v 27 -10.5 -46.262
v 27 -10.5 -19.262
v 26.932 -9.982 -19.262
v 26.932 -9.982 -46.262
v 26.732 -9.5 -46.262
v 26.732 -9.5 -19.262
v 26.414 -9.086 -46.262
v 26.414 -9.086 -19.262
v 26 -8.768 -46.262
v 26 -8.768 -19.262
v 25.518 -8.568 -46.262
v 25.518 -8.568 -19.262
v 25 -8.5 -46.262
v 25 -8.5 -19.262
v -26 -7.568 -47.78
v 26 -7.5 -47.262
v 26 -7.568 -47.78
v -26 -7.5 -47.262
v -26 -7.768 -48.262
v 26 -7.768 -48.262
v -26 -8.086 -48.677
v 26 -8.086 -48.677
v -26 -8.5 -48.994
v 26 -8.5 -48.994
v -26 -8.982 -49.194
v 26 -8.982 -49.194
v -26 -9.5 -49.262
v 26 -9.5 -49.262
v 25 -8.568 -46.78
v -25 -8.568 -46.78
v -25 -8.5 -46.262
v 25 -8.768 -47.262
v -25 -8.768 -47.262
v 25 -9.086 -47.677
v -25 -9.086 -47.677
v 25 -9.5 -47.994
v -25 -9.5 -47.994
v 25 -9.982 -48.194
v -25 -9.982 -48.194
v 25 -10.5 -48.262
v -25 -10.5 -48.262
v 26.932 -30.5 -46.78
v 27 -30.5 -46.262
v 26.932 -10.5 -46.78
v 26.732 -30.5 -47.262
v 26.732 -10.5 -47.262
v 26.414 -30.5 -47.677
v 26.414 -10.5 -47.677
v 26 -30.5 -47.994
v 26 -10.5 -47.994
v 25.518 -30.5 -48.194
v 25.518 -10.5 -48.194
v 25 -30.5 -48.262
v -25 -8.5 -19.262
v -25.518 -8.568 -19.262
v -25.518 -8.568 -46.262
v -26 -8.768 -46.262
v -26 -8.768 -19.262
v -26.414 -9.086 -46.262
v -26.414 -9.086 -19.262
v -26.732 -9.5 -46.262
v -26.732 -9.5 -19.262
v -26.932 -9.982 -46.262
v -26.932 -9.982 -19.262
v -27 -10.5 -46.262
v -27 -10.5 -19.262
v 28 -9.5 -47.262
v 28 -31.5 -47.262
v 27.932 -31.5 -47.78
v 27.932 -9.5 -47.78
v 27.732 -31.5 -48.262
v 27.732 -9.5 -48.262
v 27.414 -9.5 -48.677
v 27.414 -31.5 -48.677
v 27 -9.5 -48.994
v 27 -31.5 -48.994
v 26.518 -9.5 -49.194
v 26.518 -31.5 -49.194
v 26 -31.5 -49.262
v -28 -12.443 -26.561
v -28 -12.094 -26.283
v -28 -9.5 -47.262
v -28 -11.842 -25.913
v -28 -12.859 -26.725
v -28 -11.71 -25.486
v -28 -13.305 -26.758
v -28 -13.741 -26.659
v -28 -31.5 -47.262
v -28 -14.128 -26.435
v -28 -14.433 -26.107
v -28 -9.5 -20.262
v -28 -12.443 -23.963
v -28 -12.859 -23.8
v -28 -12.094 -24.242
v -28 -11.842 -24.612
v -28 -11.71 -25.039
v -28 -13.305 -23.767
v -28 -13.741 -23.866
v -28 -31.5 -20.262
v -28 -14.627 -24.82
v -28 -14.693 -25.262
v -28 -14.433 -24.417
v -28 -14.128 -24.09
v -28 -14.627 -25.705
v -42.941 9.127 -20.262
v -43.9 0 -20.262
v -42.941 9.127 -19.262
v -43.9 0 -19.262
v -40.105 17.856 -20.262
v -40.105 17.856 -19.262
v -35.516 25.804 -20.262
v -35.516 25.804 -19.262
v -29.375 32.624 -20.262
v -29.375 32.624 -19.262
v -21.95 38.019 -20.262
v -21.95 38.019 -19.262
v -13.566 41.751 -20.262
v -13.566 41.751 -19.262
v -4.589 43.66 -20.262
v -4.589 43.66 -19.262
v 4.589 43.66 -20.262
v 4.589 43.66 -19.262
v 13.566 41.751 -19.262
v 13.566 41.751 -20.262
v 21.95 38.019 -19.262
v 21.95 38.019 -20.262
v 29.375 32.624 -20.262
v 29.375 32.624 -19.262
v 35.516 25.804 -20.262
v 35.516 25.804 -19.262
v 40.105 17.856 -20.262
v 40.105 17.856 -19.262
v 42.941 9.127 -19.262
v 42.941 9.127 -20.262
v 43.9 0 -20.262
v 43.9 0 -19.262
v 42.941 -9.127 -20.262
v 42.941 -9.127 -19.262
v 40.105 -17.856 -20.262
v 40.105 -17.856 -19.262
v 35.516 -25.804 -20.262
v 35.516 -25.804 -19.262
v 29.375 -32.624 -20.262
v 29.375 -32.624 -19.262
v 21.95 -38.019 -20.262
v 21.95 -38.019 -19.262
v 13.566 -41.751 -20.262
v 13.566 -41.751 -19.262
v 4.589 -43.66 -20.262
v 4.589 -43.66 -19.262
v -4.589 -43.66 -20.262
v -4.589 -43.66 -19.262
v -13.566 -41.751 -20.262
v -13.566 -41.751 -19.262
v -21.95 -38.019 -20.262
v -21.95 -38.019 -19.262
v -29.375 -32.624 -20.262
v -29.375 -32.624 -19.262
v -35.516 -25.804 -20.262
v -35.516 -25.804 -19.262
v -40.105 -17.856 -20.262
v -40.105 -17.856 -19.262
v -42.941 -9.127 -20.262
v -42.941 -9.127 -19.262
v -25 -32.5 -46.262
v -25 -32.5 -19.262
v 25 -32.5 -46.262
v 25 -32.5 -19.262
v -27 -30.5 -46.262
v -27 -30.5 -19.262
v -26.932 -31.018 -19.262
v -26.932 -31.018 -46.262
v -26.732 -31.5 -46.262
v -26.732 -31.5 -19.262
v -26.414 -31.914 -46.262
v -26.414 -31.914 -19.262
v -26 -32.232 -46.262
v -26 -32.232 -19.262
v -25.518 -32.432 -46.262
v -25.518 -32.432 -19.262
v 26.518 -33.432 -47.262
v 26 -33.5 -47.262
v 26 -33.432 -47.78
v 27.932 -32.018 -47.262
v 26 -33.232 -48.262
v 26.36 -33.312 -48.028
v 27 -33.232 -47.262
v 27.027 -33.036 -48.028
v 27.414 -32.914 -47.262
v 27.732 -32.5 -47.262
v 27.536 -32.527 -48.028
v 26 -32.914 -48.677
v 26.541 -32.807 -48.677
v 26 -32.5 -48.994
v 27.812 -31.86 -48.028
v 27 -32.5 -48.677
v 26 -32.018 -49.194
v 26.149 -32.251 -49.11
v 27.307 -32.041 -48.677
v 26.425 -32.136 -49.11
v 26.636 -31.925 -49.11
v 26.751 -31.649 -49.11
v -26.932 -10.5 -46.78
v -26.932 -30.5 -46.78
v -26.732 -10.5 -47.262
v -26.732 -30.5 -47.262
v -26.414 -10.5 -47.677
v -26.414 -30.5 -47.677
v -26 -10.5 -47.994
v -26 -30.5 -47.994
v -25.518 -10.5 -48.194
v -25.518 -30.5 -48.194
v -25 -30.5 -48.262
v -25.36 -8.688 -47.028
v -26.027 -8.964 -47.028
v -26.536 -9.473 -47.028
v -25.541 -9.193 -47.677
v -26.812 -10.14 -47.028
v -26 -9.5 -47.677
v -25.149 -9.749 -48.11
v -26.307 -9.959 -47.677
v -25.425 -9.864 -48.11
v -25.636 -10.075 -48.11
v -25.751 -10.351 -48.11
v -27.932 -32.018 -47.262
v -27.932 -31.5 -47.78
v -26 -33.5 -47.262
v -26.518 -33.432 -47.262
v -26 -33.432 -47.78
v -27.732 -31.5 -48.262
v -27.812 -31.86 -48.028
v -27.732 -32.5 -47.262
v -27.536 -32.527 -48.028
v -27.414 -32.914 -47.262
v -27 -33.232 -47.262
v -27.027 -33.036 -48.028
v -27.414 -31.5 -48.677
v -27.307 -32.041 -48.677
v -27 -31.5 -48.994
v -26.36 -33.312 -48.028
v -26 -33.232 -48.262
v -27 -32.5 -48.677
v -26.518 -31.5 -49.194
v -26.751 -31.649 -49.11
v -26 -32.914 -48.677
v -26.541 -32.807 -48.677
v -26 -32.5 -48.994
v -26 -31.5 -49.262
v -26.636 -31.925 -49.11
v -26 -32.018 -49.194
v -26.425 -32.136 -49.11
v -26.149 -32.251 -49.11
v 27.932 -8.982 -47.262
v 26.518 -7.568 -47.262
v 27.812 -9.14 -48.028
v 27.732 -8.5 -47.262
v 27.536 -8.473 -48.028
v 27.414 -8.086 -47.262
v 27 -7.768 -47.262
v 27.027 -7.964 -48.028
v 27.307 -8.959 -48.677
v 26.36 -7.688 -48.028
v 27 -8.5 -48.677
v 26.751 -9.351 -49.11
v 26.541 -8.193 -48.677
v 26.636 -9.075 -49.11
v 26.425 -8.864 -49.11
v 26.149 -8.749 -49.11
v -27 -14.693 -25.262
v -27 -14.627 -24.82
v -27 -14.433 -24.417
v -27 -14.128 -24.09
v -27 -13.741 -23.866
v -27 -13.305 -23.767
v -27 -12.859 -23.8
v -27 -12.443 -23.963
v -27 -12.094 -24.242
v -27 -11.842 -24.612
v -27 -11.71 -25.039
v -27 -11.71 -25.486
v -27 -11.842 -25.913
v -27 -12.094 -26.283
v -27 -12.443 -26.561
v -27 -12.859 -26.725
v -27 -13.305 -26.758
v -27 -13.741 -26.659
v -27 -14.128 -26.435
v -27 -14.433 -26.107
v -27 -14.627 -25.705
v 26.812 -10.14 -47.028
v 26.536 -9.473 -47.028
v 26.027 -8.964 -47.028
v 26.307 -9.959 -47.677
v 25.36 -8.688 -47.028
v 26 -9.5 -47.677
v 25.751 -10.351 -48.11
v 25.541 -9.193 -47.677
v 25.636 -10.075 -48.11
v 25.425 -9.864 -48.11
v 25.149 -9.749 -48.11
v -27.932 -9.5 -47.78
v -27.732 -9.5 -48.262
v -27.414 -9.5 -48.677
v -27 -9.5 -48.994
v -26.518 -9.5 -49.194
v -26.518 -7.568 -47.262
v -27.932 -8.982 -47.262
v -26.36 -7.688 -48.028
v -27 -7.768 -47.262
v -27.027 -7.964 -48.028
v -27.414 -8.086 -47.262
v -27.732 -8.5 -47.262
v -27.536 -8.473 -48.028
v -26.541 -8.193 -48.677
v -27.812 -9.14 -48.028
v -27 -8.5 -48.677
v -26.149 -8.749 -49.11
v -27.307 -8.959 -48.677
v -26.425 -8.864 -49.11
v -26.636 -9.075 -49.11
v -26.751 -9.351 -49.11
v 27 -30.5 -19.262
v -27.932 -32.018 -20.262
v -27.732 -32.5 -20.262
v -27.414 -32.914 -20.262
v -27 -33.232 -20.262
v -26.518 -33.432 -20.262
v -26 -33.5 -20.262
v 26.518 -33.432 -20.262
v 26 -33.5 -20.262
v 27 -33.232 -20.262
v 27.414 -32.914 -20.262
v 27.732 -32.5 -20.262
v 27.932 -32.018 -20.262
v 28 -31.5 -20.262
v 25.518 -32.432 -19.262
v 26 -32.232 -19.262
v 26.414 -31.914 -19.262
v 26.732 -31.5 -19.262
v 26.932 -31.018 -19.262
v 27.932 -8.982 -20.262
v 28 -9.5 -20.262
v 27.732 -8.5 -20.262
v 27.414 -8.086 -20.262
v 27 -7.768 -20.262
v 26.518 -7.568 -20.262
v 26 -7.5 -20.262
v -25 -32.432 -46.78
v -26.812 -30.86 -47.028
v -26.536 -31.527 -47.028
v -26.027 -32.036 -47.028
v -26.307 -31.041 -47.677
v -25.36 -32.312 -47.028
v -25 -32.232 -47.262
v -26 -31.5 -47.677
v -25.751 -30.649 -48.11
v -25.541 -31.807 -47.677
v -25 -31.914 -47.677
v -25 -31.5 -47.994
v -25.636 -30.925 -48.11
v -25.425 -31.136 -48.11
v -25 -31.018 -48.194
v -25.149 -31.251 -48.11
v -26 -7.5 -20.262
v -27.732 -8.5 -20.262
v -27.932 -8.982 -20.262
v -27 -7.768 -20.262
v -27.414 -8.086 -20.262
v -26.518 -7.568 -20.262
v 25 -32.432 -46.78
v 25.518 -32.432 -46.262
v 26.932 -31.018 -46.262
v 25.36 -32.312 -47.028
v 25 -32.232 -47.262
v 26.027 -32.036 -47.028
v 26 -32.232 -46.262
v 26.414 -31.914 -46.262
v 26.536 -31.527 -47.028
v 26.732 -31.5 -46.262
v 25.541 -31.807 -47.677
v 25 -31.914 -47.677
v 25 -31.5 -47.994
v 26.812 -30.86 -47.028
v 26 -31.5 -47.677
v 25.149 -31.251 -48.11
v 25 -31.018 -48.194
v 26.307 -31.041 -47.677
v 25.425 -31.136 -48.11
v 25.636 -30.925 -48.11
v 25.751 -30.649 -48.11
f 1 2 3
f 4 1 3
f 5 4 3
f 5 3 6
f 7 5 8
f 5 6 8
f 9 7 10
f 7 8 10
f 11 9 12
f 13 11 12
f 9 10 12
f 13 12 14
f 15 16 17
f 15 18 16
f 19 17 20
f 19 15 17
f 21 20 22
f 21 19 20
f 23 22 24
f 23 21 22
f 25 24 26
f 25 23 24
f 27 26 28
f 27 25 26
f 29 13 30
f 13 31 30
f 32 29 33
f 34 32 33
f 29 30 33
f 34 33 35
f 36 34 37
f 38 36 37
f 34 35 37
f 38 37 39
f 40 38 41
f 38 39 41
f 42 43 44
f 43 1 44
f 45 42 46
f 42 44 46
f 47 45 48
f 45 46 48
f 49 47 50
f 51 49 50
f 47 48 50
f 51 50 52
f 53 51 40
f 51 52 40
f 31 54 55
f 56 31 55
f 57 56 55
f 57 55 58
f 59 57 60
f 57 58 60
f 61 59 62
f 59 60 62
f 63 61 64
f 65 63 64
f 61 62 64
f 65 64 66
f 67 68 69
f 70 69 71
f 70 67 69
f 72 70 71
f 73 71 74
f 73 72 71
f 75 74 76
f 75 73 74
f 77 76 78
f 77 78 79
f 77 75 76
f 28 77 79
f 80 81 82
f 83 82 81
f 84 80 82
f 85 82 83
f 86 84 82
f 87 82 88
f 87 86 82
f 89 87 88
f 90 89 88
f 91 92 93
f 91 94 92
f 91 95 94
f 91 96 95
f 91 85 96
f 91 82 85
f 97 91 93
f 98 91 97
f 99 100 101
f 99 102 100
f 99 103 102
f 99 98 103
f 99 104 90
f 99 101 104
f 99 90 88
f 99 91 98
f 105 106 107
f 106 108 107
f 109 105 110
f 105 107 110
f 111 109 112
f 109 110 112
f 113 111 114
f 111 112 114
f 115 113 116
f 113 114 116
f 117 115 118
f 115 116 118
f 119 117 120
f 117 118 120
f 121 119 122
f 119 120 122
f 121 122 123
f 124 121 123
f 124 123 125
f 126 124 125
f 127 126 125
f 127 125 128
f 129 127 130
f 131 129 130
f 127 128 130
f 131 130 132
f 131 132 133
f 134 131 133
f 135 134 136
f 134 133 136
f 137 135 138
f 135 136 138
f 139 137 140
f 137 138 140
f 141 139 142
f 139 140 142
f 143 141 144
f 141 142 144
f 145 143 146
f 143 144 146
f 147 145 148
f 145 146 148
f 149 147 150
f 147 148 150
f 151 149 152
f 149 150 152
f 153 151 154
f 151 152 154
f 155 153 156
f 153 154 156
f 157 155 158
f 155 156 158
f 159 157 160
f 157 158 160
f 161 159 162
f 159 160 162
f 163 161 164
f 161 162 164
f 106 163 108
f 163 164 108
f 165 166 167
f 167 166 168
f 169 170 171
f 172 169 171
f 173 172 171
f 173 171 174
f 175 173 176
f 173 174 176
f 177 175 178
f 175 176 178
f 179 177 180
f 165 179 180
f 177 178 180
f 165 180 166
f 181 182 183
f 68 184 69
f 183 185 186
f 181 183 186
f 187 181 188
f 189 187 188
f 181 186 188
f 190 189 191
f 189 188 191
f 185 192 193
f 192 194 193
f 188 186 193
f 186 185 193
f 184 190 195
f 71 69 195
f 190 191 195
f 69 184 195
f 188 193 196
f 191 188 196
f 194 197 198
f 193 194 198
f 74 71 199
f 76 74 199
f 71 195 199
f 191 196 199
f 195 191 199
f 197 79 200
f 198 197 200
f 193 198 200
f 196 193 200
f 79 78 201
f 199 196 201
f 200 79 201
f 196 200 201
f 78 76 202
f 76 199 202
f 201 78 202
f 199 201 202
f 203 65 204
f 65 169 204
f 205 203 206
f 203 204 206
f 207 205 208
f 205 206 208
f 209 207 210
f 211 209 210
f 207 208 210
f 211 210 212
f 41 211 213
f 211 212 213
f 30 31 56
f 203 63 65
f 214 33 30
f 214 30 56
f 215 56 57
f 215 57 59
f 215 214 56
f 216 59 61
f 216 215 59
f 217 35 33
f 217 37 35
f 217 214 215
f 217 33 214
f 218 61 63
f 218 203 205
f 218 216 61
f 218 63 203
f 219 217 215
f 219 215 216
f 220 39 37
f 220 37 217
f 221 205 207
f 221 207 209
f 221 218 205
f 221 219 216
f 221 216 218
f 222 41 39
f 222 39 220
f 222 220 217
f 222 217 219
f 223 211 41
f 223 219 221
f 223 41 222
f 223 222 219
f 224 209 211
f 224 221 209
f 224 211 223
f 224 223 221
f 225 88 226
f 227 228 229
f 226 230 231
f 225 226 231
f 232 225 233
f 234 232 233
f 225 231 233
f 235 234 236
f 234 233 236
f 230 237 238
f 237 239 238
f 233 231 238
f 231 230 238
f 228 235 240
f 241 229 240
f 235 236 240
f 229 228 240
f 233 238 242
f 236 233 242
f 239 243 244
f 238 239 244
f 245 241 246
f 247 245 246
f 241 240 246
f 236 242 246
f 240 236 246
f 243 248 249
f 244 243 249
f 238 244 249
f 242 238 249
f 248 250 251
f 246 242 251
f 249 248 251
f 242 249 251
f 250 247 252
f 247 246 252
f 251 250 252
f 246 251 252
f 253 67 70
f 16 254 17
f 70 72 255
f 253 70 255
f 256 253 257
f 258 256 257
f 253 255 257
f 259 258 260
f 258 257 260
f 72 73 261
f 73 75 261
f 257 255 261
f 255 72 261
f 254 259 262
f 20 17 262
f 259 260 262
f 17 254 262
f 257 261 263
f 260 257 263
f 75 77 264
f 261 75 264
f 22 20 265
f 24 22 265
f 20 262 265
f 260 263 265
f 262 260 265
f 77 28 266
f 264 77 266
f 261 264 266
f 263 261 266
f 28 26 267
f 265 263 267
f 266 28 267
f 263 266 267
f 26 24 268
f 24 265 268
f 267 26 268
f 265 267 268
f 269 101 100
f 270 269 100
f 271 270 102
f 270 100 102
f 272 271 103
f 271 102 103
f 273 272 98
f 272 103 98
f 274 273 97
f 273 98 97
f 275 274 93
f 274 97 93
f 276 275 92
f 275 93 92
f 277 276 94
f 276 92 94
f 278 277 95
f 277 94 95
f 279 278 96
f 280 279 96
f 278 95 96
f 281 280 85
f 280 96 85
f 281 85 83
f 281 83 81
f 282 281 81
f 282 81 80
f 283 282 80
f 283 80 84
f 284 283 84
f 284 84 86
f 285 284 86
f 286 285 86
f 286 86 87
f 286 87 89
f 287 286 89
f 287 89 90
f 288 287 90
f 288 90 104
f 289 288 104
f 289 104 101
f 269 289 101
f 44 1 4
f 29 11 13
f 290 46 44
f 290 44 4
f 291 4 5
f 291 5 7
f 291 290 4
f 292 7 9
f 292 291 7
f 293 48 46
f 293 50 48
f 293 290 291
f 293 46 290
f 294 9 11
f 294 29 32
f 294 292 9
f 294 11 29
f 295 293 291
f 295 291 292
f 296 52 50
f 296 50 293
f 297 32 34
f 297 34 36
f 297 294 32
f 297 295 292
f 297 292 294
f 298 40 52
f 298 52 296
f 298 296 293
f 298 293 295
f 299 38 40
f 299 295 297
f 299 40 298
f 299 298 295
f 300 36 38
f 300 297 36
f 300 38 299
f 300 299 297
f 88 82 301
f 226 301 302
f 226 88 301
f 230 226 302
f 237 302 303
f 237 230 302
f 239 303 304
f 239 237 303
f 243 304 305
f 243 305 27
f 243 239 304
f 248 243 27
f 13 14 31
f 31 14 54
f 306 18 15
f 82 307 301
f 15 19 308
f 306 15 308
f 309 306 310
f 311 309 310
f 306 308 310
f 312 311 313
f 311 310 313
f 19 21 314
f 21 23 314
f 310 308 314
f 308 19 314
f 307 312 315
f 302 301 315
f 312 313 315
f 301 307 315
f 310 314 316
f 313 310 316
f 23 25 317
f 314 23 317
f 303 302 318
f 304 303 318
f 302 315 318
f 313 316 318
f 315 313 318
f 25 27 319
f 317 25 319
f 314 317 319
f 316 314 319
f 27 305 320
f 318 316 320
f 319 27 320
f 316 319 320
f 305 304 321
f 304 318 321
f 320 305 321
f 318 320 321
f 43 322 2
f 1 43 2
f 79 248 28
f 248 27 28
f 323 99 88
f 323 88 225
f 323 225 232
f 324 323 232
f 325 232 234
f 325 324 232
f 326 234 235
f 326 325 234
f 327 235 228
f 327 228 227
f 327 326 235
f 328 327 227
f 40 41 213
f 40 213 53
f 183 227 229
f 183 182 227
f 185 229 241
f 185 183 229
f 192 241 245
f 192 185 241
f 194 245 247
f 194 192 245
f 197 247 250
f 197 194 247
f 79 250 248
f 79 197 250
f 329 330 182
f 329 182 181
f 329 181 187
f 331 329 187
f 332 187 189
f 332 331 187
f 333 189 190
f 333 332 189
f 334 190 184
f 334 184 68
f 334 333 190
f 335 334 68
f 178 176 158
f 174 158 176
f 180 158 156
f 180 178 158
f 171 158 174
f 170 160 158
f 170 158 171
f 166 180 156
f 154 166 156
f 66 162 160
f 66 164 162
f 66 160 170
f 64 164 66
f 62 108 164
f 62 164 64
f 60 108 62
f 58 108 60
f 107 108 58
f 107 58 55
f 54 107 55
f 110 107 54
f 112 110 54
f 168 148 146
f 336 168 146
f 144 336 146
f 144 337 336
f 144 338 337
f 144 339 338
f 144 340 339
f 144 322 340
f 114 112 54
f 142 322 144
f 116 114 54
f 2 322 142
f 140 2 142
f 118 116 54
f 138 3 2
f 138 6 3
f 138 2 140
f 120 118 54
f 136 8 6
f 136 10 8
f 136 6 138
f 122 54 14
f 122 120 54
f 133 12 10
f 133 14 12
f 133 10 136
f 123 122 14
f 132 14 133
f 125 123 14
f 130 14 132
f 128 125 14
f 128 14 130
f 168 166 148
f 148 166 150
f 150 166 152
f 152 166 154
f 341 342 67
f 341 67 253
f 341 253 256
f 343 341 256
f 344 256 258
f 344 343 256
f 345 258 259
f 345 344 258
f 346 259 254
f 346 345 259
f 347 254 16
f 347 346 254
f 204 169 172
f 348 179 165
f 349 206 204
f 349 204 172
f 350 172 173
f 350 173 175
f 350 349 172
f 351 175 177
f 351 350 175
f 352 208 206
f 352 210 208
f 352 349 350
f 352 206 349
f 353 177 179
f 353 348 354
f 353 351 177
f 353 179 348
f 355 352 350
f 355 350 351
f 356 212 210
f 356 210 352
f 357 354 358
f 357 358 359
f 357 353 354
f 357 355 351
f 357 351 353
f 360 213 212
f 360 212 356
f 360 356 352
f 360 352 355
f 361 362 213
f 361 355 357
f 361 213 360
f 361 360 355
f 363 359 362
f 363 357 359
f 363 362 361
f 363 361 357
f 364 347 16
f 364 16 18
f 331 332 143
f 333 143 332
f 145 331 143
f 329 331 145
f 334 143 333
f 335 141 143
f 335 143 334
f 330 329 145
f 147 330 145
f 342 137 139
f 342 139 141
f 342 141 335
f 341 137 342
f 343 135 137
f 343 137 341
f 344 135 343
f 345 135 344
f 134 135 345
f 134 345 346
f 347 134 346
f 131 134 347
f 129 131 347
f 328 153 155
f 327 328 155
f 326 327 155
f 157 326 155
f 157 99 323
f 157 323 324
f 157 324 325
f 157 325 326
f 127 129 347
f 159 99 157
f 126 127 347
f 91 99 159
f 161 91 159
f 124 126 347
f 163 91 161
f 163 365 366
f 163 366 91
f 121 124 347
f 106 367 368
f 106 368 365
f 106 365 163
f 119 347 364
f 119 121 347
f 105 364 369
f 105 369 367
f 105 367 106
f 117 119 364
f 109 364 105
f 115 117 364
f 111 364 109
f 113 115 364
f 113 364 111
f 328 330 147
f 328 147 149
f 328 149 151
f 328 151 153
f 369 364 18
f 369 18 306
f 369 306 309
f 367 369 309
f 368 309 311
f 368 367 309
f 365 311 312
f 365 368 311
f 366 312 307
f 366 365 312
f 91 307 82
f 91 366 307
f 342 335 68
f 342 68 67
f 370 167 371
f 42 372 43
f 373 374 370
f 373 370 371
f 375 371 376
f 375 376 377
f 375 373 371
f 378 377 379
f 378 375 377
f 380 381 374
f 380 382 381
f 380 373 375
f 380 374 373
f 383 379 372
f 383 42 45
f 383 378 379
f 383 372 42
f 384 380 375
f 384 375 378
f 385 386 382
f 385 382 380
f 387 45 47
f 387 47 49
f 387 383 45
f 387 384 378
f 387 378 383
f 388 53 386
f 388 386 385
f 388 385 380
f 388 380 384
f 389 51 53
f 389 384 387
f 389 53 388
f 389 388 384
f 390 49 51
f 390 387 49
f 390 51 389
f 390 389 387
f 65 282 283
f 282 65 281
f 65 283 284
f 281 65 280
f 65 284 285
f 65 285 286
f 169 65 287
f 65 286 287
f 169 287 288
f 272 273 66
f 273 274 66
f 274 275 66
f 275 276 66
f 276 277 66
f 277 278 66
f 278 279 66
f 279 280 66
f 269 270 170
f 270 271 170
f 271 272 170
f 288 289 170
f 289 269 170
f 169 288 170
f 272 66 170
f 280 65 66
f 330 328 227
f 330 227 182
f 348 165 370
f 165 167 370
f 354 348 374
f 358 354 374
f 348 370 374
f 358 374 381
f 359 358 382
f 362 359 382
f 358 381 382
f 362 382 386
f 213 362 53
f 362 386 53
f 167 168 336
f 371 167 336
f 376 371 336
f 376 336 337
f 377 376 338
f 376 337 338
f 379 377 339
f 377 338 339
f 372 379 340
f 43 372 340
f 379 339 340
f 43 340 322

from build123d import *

# Parameters (mm, degrees)
F0_W     = 43.9
F0_H     = 1
F3_DEPTH = 30
F4_DEPTH = 29
F5_R     = 2
F6_R     = 1.5
F7_DEPTH = 4.7


with BuildPart() as f1:
    # F0 (on Front) → F1 (revolve)
    with BuildSketch(Plane.XZ):
        with Locations((-21.95, -19.7623790809)):
            Rectangle(F0_W, F0_H)
    revolve(axis=Axis((0, 0, -4.4118497148), (0, 0, -1)))

    # F2 (on face) → F3 (join)
    with BuildSketch(Plane.XY.offset(-19.2623790809)):
        with BuildLine():
            Line((-26, -33.5), (26, -33.5))
            ThreePointArc((26, -33.5), (27.4142135624, -32.9142135624), (28, -31.5))
            Line((28, -31.5), (28, -9.5))
            ThreePointArc((28, -9.5), (27.4142135624, -8.0857864376), (26, -7.5))
            Line((26, -7.5), (-26, -7.5))
            ThreePointArc((-26, -7.5), (-27.4142135624, -8.0857864376), (-28, -9.5))
            Line((-28, -9.5), (-28, -31.5))
            ThreePointArc((-28, -31.5), (-27.4142135624, -32.9142135624), (-26, -33.5))
        make_face()
        with BuildLine():
            Line((-24.9999995768, -8.5000004232), (24.9999995768, -8.5000004232))
            ThreePointArc((24.9999995768, -8.5000004232), (26.4142131392, -9.0857868608), (26.9999995768, -10.5000004232))
            Line((26.9999995768, -10.5000004232), (26.9999995768, -30.4999995768))
            ThreePointArc((26.9999995768, -30.4999995768), (26.4142131392, -31.9142131392), (24.9999995768, -32.4999995768))
            Line((24.9999995768, -32.4999995768), (-24.9999995768, -32.4999995768))
            ThreePointArc((-24.9999995768, -32.4999995768), (-26.4142131392, -31.9142131392), (-26.9999995768, -30.4999995768))
            Line((-26.9999995768, -30.4999995768), (-26.9999995768, -10.5000004232))
            ThreePointArc((-26.9999995768, -10.5000004232), (-26.4142131392, -9.0857868608), (-24.9999995768, -8.5000004232))
        make_face(mode=Mode.SUBTRACT)
        with BuildLine():
            ThreePointArc((26.9999995768, -10.5000004232), (26.4142131392, -9.0857868608), (24.9999995768, -8.5000004232))
            Line((24.9999995768, -8.5000004232), (-24.9999995768, -8.5000004232))
            ThreePointArc((-24.9999995768, -8.5000004232), (-26.4142131392, -9.0857868608), (-26.9999995768, -10.5000004232))
            Line((-26.9999995768, -10.5000004232), (-26.9999995768, -30.4999995768))
            ThreePointArc((-26.9999995768, -30.4999995768), (-26.4142131392, -31.9142131392), (-24.9999995768, -32.4999995768))
            Line((-24.9999995768, -32.4999995768), (24.9999995768, -32.4999995768))
            ThreePointArc((24.9999995768, -32.4999995768), (26.4142131392, -31.9142131392), (26.9999995768, -30.4999995768))
            Line((26.9999995768, -30.4999995768), (26.9999995768, -10.5000004232))
        make_face()
    extrude(amount=-F3_DEPTH)

    # F2 (on face) → F4 (cut)
    with BuildSketch(Plane.XY.offset(-19.2623790809)):
        with BuildLine():
            ThreePointArc((26.9999995768, -10.5000004232), (26.4142131392, -9.0857868608), (24.9999995768, -8.5000004232))
            Line((24.9999995768, -8.5000004232), (-24.9999995768, -8.5000004232))
            ThreePointArc((-24.9999995768, -8.5000004232), (-26.4142131392, -9.0857868608), (-26.9999995768, -10.5000004232))
            Line((-26.9999995768, -10.5000004232), (-26.9999995768, -30.4999995768))
            ThreePointArc((-26.9999995768, -30.4999995768), (-26.4142131392, -31.9142131392), (-24.9999995768, -32.4999995768))
            Line((-24.9999995768, -32.4999995768), (24.9999995768, -32.4999995768))
            ThreePointArc((24.9999995768, -32.4999995768), (26.4142131392, -31.9142131392), (26.9999995768, -30.4999995768))
            Line((26.9999995768, -30.4999995768), (26.9999995768, -10.5000004232))
        make_face()
    extrude(amount=-F4_DEPTH, mode=Mode.SUBTRACT)

    # F5
    f5_edges = [f1.edges().sort_by_distance(p)[0] for p in [
        (0, -33.5, -49.262379),
        (27.414214, -32.914214, -49.262379),
        (28, -20.5, -49.262379),
        (27.414214, -8.085786, -49.262379),
        (0, -7.5, -49.262379),
        (-27.414214, -8.085786, -49.262379),
        (-28, -20.5, -49.262379),
        (-27.414214, -32.914214, -49.262379),
        (26.414213, -9.085787, -48.262379),
        (0, -8.5, -48.262379),
        (-26.414213, -9.085787, -48.262379),
        (-27, -20.5, -48.262379),
        (-26.414213, -31.914213, -48.262379),
        (0, -32.5, -48.262379),
        (26.414213, -31.914213, -48.262379),
        (27, -20.5, -48.262379),
    ]]
    fillet(f5_edges, radius=F5_R)

    # F6 (on face) → F7 (cut)
    with BuildSketch(Plane(origin=(-28, 0, 0), x_dir=(0, -1, 0), z_dir=(-1, 0, 0))):
        with Locations((13.193259947, -25.2623790809)):
            Circle(F6_R)
    extrude(amount=-F7_DEPTH, mode=Mode.SUBTRACT)


solid = f1.part
